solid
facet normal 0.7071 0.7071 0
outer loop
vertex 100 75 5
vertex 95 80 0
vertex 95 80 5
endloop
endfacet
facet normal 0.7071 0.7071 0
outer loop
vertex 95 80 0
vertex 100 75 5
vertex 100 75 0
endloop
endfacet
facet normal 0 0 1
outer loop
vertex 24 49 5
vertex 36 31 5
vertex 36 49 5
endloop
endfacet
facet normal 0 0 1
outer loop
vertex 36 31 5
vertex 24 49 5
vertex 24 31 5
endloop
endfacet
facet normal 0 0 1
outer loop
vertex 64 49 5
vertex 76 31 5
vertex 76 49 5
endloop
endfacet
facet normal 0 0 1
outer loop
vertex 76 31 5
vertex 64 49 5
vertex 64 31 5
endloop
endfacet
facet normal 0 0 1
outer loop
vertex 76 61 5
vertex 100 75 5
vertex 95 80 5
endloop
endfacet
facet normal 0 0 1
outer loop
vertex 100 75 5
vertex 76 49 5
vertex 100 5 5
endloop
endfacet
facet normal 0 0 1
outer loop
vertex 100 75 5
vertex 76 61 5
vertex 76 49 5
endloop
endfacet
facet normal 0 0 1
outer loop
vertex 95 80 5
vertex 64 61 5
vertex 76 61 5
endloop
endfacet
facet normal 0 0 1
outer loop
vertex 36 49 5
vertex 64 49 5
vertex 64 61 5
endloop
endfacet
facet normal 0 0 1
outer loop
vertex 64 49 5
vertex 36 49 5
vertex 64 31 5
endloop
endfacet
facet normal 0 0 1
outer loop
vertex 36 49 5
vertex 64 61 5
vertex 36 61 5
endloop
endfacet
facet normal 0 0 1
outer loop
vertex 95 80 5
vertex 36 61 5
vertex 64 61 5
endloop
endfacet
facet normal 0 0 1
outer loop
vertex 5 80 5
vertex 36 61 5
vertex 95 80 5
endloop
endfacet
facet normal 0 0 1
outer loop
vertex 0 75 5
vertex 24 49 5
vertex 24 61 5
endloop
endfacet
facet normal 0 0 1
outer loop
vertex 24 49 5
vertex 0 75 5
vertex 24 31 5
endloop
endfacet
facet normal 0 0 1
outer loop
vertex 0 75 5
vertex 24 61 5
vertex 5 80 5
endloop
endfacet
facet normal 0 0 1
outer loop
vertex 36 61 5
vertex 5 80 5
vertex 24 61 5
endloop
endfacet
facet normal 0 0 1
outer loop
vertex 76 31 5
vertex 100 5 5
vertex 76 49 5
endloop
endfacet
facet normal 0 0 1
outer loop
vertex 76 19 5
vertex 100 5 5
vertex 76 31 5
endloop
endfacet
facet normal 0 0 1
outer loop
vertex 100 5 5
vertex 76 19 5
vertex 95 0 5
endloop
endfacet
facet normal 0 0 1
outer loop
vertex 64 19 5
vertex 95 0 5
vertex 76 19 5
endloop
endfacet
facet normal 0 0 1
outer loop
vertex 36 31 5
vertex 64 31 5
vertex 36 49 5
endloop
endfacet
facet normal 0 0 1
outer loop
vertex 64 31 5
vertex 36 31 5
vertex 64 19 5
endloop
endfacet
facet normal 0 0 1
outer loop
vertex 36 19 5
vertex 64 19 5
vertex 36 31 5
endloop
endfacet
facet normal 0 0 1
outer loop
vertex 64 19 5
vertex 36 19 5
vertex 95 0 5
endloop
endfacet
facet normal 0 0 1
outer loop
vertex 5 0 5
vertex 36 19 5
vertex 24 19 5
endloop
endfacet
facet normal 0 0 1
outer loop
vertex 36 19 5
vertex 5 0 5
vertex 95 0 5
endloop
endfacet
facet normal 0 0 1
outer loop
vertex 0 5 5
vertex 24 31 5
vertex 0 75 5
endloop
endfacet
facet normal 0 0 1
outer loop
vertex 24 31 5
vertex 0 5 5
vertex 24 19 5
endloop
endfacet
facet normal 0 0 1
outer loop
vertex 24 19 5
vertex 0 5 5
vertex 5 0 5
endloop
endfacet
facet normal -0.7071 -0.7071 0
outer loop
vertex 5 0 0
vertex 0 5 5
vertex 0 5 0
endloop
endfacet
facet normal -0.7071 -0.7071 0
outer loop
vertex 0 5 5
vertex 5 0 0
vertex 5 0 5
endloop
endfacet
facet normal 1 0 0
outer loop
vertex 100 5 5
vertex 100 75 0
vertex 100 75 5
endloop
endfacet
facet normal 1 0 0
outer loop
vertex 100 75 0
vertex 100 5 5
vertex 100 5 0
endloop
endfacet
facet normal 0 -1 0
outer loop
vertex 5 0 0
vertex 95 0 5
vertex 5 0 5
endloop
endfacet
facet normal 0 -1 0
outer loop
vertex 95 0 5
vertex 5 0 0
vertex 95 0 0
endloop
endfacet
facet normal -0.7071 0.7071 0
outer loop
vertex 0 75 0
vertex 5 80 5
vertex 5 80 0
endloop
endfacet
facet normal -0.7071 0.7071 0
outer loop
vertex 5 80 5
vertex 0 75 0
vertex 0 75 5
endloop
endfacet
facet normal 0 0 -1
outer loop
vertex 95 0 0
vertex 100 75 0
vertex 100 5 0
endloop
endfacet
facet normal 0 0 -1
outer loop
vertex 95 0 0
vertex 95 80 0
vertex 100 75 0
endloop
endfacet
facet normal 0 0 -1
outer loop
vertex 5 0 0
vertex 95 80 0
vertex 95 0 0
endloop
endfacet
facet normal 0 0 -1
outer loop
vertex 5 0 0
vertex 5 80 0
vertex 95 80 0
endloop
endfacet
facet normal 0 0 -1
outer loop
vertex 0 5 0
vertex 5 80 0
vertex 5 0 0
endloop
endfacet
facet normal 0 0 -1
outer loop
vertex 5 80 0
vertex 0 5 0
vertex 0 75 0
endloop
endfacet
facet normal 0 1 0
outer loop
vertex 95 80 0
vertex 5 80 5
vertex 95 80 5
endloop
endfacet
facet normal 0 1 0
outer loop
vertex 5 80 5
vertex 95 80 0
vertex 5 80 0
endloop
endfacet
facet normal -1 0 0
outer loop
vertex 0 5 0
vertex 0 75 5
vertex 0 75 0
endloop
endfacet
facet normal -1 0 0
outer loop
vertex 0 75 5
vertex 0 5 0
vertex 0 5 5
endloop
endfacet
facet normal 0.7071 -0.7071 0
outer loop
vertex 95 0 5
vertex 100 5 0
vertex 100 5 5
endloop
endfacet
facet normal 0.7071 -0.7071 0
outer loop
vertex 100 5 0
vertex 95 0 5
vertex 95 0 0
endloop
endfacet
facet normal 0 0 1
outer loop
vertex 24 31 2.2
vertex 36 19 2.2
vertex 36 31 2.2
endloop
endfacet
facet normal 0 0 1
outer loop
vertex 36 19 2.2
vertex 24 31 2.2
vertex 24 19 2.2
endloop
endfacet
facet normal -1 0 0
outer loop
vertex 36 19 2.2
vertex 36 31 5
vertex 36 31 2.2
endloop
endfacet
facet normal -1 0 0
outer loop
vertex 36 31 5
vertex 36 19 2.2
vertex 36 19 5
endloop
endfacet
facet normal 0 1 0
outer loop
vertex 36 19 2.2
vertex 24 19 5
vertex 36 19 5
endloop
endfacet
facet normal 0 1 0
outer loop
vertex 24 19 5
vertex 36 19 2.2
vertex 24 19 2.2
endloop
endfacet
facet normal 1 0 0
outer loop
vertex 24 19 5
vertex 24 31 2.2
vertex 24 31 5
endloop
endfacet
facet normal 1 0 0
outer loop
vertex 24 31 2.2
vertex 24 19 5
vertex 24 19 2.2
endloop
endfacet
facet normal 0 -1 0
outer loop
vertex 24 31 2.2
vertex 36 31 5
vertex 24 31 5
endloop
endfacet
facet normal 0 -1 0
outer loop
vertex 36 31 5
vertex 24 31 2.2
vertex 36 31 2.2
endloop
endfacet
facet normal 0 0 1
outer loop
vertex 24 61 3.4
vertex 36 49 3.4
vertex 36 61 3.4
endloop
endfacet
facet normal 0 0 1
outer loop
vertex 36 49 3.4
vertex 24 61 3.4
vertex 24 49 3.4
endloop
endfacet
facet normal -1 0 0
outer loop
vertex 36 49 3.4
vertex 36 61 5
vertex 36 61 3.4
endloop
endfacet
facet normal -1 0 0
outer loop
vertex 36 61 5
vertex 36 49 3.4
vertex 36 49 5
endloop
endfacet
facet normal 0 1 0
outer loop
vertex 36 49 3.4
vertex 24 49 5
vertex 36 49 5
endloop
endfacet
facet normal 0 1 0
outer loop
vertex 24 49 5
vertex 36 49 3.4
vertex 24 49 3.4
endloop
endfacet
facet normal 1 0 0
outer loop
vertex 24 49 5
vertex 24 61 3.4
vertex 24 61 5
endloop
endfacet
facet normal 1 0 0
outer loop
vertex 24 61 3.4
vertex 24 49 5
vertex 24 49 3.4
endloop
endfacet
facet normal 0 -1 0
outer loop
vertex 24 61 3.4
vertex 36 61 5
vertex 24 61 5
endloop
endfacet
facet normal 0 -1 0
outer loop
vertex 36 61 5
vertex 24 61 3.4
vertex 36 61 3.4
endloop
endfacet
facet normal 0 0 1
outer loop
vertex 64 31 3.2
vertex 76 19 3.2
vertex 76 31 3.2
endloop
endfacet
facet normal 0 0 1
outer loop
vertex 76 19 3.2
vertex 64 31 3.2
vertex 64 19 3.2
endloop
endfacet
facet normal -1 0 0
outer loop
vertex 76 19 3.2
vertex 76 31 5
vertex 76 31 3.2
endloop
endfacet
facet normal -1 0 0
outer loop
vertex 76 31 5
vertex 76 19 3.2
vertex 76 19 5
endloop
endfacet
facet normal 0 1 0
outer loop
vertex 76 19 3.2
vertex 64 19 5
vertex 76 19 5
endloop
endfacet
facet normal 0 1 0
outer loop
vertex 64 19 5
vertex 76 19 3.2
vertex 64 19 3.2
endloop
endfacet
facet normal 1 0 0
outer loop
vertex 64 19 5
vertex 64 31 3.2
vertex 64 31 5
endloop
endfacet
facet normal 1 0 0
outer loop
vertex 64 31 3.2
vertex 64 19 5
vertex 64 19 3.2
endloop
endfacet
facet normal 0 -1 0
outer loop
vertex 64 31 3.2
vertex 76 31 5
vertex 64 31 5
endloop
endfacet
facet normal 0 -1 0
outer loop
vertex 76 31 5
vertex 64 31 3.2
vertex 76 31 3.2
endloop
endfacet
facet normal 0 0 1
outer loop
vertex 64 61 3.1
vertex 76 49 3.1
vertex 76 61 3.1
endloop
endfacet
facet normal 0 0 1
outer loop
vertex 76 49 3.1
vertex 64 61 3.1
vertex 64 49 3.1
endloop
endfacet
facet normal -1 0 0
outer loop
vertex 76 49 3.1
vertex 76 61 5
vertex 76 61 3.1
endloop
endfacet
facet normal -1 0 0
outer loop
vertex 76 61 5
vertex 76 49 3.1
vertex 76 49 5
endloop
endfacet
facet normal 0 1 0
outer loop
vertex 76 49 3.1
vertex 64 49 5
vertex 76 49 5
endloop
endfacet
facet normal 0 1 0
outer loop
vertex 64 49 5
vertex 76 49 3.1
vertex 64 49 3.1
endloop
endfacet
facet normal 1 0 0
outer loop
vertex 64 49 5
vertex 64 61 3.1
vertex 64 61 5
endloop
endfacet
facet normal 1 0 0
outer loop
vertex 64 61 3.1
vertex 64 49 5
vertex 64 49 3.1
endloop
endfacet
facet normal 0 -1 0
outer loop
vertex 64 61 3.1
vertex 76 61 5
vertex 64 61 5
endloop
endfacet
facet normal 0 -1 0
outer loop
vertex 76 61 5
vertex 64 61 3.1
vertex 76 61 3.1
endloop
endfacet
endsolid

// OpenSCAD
$fn = 32;

// ----------------------------------------------------------------------
// Windowed plate: 4 voids, 100 x 80 x 5 mm
// ----------------------------------------------------------------------

// --- parameters (mm) ---
plate_l = 100;            // plate length, X
plate_w = 80;             // plate width, Y
plate_t = 5;              // plate thickness, Z
edge_margin = 10;         // wall from the plate edge to any window
win_l = 12;               // pocket length
win_w = 12;               // pocket width
pitch_x = 40;             // grid pitch along X
pitch_y = 30;             // grid pitch along Y
depth_1 = 2.8;            // depth of void 1 (full thickness = through)
depth_2 = 1.6;            // depth of void 2 (full thickness = through)
depth_3 = 1.8;            // depth of void 3 (full thickness = through)
depth_4 = 1.9;            // depth of void 4 (full thickness = through)
corner_c = 5;             // corner chamfer of the plate

profile = [[5, 0], [95, 0], [100, 5], [100, 75], [95, 80], [5, 80], [0, 75], [0, 5]];  // primary outline, 8 points, counter clockwise
void_1 = [[24, 19], [36, 19], [36, 31], [24, 31]];  // pocket at grid node 0,0, 4 points
void_2 = [[24, 49], [36, 49], [36, 61], [24, 61]];  // pocket at grid node 0,1, 4 points
void_3 = [[64, 19], [76, 19], [76, 31], [64, 31]];  // pocket at grid node 1,0, 4 points
void_4 = [[64, 49], [76, 49], [76, 61], [64, 61]];  // pocket at grid node 1,1, 4 points

// --- the one profile operation ---
difference() {
  linear_extrude(height = plate_t) polygon(points = profile);
  translate([0, 0, plate_t - depth_1])
    linear_extrude(height = depth_1 + 1) polygon(points = void_1);
  translate([0, 0, plate_t - depth_2])
    linear_extrude(height = depth_2 + 1) polygon(points = void_2);
  translate([0, 0, plate_t - depth_3])
    linear_extrude(height = depth_3 + 1) polygon(points = void_3);
  translate([0, 0, plate_t - depth_4])
    linear_extrude(height = depth_4 + 1) polygon(points = void_4);
}
